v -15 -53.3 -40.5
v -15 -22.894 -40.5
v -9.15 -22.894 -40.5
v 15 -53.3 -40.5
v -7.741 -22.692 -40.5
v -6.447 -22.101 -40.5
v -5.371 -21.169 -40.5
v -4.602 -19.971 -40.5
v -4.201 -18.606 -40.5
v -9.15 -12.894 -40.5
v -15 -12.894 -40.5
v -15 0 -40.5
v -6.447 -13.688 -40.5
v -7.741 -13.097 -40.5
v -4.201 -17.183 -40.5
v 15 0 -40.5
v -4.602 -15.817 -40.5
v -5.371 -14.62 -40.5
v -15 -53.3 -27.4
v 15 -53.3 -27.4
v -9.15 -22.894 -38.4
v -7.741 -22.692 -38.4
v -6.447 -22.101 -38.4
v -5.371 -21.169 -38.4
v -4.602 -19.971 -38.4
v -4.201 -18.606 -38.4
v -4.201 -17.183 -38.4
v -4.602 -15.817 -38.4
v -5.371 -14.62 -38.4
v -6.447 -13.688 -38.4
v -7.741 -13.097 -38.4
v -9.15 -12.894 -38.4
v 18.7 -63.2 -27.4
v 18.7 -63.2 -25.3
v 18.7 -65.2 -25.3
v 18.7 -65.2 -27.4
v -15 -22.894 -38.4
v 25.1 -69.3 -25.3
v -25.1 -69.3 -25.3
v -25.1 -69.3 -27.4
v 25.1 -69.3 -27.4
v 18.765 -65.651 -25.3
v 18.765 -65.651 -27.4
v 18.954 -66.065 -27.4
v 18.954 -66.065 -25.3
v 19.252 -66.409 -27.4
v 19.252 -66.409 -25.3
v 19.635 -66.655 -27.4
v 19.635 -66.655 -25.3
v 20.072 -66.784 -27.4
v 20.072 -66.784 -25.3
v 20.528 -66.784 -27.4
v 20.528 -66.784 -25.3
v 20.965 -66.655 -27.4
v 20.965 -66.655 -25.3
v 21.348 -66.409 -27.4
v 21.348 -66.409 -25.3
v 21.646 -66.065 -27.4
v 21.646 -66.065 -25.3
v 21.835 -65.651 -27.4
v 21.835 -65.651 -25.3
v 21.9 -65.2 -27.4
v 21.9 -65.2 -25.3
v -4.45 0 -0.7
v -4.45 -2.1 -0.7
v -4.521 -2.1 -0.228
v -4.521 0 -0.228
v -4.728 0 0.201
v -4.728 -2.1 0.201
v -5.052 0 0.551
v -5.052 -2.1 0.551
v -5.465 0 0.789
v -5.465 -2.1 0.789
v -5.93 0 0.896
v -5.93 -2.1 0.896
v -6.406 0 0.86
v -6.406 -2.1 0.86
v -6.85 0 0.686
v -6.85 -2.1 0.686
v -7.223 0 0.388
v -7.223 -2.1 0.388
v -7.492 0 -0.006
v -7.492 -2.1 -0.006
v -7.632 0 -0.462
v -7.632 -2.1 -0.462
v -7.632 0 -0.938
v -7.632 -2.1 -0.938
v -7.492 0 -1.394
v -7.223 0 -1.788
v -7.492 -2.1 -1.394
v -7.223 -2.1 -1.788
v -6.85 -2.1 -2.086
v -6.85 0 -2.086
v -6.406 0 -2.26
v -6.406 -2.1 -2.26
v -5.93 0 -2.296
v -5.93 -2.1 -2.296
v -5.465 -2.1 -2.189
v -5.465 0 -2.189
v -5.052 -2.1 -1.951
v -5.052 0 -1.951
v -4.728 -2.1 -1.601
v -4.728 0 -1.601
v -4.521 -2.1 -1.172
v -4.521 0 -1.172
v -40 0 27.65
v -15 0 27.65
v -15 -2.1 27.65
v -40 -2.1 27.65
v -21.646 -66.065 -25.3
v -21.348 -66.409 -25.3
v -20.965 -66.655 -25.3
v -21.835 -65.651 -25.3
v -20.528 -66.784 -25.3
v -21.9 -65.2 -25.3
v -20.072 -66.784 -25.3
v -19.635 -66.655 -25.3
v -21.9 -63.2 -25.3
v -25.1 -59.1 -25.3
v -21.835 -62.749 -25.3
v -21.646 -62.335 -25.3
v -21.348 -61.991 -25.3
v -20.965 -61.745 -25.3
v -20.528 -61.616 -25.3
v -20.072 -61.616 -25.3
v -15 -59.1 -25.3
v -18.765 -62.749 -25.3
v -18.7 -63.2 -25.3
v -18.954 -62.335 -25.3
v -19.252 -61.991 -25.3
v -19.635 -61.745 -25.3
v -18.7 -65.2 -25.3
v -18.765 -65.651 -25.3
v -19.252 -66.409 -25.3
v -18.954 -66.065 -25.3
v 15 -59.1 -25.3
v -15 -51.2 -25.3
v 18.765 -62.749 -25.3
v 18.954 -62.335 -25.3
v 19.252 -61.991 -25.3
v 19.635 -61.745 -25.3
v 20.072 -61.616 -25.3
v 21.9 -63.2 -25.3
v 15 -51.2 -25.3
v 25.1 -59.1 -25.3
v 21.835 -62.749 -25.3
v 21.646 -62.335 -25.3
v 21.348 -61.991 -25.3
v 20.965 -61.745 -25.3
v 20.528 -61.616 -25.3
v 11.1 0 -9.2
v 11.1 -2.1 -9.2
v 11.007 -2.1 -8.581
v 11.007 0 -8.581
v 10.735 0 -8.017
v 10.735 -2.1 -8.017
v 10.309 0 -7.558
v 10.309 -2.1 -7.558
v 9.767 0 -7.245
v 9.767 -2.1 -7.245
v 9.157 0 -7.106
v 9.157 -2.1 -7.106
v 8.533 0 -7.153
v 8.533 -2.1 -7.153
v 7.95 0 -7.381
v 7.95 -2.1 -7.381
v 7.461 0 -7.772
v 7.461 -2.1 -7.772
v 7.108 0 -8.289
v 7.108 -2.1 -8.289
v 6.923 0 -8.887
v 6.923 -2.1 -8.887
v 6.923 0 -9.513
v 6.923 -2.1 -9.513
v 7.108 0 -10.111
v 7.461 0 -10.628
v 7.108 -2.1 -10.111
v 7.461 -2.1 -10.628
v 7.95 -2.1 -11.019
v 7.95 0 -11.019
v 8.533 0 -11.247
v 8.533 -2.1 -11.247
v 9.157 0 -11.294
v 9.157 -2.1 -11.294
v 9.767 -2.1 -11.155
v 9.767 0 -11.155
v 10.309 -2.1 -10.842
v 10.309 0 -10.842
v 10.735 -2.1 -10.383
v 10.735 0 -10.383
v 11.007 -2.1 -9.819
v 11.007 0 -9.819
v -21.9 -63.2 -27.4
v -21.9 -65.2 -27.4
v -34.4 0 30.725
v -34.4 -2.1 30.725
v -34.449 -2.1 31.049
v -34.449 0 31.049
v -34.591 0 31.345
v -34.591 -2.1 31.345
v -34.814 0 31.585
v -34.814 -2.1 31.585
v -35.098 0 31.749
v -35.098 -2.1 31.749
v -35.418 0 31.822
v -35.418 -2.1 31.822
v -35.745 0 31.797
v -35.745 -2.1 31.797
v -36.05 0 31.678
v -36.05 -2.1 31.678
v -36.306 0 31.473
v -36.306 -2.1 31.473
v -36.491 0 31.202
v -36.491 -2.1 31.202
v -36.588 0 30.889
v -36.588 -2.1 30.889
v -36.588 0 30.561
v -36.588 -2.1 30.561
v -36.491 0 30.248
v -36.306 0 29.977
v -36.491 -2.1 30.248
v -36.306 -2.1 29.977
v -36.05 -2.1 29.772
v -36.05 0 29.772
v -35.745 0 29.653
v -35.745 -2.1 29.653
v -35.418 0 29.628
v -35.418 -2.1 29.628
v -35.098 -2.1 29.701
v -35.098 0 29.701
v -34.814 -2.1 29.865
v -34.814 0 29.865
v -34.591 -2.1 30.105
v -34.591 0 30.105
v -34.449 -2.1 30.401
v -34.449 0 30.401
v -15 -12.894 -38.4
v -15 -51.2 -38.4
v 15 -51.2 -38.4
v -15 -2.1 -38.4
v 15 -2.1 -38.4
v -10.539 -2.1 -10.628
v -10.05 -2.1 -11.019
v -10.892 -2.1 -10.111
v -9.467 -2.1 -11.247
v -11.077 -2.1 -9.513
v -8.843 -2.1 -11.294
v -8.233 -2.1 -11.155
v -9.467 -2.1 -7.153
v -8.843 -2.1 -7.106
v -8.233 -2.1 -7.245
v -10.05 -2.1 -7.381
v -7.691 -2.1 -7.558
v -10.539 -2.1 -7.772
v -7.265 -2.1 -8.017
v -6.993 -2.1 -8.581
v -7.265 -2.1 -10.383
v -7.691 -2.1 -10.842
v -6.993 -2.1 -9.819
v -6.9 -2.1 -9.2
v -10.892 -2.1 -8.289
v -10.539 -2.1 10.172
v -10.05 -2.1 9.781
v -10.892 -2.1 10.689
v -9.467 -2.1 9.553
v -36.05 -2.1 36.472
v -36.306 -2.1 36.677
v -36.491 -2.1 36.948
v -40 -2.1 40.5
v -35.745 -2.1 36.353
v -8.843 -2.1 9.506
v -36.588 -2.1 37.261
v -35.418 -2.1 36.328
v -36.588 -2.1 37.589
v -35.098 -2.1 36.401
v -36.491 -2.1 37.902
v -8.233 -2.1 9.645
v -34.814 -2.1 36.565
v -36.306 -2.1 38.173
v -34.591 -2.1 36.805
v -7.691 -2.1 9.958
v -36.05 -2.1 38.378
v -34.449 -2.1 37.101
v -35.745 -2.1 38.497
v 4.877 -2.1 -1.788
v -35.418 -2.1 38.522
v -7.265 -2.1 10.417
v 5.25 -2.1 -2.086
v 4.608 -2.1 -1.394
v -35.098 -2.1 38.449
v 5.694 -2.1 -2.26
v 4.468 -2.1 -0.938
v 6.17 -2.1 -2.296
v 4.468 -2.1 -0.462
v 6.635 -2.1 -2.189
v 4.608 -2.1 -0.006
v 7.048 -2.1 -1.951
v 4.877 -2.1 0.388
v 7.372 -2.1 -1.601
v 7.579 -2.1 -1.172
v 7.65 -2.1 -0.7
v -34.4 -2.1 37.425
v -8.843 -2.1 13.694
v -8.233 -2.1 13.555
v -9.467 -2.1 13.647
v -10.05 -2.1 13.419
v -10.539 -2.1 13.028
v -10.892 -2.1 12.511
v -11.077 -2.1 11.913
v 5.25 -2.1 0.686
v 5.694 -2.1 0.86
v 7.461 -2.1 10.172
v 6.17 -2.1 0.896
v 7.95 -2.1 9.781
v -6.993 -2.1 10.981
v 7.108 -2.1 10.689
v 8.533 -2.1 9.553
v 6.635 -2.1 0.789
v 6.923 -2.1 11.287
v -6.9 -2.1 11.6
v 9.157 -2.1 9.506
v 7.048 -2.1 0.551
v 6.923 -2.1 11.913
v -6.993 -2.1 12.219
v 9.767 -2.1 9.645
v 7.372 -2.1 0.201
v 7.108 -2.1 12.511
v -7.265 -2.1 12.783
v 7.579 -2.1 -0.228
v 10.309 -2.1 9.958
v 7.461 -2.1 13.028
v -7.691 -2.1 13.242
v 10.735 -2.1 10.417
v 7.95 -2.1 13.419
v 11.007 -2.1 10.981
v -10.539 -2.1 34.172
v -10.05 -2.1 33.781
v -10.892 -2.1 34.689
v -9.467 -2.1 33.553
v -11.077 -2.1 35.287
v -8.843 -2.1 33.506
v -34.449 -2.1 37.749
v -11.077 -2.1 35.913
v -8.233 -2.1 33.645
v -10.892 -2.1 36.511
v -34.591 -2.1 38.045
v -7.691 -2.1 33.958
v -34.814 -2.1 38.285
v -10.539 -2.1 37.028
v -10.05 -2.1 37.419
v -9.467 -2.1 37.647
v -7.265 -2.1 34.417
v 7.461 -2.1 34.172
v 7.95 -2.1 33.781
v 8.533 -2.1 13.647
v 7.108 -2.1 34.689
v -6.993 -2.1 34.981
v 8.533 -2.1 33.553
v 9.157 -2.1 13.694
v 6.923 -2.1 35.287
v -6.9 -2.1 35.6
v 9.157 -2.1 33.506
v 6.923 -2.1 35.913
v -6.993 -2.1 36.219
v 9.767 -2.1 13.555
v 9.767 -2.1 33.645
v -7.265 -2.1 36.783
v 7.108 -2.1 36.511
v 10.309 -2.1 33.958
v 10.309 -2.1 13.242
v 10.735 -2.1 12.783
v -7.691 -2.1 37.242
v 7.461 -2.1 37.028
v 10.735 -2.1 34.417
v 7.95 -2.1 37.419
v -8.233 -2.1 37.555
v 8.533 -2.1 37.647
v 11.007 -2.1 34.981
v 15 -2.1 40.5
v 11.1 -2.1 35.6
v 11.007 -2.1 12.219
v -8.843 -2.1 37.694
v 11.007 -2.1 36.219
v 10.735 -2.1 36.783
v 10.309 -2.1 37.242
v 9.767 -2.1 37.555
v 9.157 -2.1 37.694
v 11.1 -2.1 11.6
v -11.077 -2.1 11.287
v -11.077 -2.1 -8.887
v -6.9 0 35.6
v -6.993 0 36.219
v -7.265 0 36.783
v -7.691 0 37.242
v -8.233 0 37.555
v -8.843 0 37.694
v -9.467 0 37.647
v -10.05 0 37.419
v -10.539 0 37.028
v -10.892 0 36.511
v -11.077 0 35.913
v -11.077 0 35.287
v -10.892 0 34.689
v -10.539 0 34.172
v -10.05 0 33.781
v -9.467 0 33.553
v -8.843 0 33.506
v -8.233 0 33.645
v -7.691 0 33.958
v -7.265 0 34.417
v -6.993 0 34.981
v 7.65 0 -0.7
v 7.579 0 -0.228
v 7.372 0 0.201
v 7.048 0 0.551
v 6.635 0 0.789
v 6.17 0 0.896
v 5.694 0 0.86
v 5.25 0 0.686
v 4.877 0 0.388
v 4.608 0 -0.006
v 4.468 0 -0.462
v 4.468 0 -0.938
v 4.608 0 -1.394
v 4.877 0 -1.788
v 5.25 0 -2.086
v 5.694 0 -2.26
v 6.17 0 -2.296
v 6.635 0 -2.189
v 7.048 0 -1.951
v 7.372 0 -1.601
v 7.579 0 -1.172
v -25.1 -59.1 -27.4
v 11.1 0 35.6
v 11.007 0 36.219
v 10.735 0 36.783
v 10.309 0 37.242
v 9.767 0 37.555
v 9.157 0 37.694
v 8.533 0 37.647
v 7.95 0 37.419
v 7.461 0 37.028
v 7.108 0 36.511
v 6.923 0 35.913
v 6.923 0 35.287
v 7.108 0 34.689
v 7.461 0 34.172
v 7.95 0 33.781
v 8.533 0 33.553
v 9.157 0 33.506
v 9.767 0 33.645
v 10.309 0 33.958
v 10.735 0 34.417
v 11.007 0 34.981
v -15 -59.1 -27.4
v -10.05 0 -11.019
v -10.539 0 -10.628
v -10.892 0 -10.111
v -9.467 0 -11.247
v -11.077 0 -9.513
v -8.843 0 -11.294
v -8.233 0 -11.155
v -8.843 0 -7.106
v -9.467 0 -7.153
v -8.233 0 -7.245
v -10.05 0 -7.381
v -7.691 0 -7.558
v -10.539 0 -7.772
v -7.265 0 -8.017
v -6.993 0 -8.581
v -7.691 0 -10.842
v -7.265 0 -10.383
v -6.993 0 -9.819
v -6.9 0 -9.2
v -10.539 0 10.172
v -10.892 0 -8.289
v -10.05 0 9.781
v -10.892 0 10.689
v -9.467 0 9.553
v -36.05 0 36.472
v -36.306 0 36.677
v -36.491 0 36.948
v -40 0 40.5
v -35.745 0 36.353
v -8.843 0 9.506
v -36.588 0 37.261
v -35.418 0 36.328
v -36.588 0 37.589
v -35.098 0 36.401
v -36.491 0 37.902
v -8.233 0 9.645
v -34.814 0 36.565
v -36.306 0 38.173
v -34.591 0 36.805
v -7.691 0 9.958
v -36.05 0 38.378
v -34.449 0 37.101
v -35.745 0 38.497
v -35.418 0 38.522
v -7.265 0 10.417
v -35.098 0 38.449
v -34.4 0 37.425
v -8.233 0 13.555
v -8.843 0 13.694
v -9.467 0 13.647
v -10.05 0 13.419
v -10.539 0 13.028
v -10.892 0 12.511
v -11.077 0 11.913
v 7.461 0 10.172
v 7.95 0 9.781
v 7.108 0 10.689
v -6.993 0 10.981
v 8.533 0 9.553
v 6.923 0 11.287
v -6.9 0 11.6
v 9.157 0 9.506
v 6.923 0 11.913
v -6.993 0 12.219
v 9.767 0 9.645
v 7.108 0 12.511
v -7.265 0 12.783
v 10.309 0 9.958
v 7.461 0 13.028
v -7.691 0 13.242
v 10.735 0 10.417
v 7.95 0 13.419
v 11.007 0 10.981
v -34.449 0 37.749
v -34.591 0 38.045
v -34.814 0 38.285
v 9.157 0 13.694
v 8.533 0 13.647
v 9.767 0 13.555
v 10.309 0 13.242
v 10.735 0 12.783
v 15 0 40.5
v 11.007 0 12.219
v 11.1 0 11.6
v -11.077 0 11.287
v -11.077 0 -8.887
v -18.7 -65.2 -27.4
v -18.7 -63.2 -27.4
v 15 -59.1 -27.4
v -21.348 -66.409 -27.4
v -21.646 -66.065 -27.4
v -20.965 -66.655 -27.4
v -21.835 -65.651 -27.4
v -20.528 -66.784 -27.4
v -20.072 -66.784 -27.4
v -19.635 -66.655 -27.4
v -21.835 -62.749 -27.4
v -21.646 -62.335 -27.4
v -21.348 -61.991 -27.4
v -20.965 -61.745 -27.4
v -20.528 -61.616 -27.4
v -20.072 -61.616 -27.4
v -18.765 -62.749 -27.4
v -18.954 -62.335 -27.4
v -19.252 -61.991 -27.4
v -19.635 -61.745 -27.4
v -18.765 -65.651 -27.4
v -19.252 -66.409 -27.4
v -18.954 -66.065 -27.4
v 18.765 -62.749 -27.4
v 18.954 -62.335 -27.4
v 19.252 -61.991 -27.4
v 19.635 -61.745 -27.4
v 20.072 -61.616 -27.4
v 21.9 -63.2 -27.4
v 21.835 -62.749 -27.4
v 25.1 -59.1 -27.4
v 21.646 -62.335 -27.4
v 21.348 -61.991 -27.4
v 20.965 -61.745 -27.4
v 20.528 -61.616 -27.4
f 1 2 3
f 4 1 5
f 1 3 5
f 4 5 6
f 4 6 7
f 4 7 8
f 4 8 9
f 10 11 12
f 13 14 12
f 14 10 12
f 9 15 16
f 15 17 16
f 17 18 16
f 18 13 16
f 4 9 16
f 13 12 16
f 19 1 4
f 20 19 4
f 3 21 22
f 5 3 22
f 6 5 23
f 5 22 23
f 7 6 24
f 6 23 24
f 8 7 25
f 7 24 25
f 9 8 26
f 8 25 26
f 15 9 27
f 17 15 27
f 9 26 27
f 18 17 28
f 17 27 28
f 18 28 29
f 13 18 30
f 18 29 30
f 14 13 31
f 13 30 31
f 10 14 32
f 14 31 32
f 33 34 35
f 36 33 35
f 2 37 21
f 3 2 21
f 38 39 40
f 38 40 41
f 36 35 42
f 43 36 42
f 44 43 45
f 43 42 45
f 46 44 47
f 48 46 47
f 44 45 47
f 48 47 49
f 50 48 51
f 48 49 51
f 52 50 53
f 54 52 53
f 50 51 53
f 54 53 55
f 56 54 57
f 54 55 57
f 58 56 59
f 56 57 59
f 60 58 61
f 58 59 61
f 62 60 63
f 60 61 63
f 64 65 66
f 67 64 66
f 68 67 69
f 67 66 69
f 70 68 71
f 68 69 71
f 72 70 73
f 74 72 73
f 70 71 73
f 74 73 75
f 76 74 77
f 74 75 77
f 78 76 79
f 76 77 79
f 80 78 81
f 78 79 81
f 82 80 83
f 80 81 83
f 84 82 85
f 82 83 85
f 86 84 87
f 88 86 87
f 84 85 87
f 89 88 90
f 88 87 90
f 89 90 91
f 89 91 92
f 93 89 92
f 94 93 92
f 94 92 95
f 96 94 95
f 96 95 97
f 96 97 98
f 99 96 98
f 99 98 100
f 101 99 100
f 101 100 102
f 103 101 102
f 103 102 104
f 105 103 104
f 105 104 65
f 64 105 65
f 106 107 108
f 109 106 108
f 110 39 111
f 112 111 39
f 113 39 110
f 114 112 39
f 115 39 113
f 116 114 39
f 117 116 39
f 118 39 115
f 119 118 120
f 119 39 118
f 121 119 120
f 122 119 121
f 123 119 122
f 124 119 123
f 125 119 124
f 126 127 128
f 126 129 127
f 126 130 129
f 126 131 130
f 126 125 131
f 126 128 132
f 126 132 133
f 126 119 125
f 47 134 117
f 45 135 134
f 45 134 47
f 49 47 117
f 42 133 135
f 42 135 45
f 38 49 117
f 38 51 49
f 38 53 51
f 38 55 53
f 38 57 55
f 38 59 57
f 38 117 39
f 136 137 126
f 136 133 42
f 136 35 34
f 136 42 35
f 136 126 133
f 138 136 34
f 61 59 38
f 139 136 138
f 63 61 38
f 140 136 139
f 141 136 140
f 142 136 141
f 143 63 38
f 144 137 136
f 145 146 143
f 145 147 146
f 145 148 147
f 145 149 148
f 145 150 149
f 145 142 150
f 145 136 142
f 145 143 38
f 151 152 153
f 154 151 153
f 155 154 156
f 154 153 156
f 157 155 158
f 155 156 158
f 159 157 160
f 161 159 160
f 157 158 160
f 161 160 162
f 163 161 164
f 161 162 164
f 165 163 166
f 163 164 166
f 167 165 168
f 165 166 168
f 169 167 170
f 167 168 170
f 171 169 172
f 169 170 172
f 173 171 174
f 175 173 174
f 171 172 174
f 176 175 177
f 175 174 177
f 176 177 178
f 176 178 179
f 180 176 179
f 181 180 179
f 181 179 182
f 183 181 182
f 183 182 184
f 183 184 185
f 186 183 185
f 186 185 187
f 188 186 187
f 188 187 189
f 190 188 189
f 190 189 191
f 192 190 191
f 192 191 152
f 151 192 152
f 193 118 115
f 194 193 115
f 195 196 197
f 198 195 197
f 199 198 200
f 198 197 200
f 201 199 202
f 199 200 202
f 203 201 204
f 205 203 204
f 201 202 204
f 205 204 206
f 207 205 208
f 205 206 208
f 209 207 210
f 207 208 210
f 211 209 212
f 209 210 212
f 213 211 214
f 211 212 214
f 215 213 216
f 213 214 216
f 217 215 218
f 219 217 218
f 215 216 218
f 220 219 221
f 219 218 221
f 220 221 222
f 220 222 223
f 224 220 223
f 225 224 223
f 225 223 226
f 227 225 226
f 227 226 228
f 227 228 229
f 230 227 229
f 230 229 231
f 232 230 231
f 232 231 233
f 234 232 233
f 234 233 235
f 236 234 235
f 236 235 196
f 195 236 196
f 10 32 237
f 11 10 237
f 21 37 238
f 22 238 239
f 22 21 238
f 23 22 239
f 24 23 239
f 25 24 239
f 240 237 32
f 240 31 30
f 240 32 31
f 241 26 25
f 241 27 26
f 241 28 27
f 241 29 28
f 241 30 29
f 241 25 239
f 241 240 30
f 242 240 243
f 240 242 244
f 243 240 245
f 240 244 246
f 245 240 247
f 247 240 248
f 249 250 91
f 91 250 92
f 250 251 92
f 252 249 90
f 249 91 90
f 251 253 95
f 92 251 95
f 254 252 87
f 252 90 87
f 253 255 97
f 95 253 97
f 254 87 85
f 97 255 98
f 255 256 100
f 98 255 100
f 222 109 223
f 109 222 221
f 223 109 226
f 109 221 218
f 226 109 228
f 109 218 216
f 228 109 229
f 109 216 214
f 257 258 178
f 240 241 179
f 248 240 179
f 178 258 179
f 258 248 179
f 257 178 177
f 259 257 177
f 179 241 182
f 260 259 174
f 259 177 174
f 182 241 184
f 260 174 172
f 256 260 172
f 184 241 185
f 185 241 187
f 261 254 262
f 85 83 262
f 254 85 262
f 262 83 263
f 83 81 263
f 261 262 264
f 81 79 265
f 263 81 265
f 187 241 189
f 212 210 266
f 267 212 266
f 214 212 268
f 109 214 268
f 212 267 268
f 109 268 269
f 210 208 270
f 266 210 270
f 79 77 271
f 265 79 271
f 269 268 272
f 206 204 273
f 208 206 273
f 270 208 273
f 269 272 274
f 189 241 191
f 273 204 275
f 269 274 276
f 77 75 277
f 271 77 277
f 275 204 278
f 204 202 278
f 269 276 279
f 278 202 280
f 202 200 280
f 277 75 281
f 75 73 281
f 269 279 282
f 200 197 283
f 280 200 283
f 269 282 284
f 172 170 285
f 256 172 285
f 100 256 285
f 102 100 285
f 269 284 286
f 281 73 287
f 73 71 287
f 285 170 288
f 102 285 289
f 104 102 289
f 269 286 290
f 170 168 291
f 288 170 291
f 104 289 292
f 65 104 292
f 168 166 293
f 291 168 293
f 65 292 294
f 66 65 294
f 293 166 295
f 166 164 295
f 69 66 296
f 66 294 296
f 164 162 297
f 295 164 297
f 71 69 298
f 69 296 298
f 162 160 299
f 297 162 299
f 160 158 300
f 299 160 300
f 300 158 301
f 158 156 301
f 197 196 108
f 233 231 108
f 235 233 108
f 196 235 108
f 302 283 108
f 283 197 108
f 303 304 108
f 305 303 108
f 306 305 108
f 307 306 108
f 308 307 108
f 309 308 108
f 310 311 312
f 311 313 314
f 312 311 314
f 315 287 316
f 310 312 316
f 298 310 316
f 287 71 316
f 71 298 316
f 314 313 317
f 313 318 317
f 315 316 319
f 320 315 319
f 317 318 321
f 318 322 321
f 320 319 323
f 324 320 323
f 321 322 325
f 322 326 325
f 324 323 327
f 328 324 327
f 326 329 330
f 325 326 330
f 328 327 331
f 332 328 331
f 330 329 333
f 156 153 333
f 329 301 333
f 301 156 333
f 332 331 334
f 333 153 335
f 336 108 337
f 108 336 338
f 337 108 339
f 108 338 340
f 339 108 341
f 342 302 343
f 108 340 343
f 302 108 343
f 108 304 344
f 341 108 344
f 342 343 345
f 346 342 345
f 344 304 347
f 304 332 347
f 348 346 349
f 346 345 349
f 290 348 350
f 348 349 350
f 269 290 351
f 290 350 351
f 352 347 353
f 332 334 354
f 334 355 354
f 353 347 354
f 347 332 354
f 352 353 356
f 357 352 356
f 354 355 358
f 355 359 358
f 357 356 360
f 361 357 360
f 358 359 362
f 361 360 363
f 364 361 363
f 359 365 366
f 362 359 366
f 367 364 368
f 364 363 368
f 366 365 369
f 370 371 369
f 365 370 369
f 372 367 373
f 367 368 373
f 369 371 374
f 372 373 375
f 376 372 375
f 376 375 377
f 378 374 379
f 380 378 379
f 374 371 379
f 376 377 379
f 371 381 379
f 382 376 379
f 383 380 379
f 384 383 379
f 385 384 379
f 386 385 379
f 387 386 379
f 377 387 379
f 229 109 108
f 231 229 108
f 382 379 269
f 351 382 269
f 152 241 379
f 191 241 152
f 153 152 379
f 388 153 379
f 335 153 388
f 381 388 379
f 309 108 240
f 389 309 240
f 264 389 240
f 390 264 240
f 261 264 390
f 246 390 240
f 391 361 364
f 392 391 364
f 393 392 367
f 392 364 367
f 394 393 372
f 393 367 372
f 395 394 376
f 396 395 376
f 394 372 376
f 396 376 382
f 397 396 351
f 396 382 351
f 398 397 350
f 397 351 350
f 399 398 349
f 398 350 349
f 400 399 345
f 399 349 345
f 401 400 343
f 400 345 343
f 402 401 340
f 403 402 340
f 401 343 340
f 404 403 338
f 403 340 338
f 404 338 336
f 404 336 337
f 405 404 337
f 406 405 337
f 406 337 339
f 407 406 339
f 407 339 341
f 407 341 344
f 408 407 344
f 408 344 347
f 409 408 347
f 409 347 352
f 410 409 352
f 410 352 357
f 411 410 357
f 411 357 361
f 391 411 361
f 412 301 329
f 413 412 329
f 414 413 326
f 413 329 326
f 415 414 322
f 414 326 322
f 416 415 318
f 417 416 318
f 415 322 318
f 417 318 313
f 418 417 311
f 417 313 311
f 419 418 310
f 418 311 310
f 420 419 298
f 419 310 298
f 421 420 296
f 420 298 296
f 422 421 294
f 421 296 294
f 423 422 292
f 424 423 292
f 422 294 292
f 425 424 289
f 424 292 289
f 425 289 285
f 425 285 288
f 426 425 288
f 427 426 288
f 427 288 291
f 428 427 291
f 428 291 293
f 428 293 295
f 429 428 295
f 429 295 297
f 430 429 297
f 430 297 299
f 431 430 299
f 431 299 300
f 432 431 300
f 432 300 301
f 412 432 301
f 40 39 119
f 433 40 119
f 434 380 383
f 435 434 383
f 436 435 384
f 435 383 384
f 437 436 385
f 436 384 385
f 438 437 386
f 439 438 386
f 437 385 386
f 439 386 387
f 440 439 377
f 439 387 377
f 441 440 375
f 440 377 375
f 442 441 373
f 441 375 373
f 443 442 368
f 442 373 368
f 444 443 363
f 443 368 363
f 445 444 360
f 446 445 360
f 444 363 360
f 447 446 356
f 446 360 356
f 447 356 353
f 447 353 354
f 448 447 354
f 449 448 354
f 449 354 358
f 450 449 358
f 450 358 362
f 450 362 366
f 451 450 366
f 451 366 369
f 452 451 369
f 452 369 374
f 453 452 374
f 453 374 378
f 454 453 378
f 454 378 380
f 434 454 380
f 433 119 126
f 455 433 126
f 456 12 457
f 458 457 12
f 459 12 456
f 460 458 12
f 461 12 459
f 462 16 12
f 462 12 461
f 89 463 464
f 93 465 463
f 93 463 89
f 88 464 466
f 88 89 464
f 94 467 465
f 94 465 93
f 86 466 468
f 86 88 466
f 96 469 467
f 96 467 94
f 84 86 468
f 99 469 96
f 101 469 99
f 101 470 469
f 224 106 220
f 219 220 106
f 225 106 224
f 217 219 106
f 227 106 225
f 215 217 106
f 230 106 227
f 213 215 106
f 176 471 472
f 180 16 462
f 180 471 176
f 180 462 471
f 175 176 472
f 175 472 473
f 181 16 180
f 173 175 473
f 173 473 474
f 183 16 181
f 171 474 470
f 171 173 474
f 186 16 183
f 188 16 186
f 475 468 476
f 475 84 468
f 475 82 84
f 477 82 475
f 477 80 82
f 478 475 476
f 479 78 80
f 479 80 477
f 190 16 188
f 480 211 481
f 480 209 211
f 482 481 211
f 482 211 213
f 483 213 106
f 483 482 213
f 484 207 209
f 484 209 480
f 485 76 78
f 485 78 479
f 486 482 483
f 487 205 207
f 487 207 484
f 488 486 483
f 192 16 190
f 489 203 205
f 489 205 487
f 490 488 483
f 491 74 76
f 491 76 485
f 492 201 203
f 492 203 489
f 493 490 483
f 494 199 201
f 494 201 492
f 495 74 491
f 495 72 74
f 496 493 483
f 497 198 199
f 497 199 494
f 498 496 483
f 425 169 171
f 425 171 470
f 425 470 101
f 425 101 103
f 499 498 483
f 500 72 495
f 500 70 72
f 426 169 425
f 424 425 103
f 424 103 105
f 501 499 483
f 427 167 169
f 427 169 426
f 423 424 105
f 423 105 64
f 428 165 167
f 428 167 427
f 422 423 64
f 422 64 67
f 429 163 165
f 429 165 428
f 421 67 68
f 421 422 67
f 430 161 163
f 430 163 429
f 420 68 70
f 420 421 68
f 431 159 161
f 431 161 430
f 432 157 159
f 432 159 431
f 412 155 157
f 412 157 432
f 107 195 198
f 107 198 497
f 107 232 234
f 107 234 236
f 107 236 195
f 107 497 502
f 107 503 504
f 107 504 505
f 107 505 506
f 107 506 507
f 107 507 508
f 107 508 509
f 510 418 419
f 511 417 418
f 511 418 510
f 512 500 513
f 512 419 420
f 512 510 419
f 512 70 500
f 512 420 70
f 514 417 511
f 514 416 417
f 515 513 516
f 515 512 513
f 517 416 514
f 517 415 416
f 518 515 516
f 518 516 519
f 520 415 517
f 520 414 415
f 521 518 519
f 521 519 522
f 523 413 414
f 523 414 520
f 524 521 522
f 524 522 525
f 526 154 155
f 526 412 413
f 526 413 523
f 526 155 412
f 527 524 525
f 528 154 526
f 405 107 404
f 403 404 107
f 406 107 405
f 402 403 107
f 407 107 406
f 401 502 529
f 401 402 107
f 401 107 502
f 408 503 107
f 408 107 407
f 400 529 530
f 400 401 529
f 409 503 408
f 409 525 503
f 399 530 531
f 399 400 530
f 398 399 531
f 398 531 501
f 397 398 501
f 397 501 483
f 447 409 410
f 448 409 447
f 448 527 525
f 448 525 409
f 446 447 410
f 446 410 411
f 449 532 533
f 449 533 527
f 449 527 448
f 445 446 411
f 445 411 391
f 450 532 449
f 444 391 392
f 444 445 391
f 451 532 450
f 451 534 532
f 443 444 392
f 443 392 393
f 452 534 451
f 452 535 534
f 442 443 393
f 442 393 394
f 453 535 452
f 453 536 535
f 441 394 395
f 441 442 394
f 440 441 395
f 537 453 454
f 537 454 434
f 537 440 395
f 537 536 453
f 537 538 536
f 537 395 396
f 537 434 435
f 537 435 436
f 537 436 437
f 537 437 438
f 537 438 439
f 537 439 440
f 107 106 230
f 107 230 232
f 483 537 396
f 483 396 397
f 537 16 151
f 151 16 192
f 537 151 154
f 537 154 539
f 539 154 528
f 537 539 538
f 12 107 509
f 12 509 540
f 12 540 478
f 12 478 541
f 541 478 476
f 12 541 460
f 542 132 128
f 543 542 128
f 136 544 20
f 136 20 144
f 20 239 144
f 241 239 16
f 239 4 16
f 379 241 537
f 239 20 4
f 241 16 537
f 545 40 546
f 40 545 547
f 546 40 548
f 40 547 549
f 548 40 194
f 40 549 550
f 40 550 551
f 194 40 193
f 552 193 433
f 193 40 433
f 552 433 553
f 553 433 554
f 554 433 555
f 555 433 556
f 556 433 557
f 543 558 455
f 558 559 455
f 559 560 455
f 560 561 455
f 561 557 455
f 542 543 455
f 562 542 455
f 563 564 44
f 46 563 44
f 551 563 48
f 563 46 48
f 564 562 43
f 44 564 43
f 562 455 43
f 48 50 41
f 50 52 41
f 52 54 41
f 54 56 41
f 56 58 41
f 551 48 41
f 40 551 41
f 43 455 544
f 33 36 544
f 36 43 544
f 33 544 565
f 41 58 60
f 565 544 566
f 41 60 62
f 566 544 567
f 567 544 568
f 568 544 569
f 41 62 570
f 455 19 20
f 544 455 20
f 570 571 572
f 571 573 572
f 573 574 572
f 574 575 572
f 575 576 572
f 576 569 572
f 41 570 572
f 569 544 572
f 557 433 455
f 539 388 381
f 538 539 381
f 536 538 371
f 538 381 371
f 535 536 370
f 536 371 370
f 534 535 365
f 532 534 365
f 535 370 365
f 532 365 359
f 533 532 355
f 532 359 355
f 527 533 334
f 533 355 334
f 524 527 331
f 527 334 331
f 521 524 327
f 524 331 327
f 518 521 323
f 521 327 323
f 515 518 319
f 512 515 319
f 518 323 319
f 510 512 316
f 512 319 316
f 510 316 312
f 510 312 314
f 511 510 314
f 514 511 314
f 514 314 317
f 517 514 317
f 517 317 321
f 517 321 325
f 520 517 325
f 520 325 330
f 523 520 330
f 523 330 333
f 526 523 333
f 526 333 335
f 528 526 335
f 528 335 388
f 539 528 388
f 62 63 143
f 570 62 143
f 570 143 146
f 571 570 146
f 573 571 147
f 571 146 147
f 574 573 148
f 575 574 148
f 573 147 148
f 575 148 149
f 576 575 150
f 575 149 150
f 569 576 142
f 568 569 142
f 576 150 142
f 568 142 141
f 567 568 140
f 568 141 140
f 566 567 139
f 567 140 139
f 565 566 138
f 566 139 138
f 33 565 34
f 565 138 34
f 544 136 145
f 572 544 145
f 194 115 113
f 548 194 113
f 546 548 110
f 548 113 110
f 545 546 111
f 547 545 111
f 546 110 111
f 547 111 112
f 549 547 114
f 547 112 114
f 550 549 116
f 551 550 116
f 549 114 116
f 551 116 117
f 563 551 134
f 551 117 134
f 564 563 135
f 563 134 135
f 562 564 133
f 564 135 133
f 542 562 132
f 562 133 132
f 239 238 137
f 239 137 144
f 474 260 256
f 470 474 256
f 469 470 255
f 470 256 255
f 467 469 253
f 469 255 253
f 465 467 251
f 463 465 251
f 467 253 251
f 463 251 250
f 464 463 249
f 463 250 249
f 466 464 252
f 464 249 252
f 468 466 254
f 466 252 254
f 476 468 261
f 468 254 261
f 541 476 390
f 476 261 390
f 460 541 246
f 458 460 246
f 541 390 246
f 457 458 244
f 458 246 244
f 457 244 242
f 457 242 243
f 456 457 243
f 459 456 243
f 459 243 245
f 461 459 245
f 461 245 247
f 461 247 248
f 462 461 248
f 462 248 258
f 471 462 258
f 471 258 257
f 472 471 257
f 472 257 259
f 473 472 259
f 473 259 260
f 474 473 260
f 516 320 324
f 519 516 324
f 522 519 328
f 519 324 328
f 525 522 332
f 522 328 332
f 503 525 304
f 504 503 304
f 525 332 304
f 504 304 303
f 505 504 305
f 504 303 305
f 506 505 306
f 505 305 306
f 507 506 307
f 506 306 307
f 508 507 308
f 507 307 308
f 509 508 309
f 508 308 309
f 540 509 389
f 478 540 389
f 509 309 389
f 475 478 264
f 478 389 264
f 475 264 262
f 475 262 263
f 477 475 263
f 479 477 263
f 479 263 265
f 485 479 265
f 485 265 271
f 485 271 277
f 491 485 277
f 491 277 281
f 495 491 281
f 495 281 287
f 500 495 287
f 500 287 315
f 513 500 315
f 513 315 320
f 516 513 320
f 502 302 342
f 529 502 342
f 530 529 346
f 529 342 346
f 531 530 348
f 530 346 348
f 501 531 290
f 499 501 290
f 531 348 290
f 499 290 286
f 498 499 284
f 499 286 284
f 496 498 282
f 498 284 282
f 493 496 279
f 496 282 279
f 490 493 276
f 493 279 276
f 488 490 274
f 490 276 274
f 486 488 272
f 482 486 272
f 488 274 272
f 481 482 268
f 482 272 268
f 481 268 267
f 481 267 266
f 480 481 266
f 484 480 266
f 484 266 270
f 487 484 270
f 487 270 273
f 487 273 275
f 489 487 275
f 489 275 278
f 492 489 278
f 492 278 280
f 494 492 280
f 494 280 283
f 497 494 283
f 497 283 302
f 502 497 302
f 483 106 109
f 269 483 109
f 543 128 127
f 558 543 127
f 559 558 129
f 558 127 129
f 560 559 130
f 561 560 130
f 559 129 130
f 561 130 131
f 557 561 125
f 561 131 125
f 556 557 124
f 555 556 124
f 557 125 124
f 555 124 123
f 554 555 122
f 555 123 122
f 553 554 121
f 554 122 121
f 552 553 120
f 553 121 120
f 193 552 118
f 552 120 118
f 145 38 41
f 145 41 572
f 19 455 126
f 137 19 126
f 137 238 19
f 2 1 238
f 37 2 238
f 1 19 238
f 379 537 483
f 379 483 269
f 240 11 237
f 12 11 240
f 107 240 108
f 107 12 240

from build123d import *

# Parameters (mm, degrees)
F0_W      = 30
F0_H      = 81
F1_DEPTH  = 2.1
F2_W      = 30
F2_H      = 2.1
F3_DEPTH  = 51.2
F4_W      = 30
F4_H      = 2.1
F5_DEPTH  = 13.1
F6_W      = 30
F6_H      = 2.1
F7_DEPTH  = 16
F8_W      = 10.1
F8_H      = 10.2
F9_DEPTH  = 2.1
F11_DEPTH = 15.201
F13_DEPTH = 2.101
F14_R     = 2.1
F14_R_2   = 1.6
F15_DEPTH = 2.101
F16_W     = 2.1
F16_H     = 12.85
F17_DEPTH = 25
F18_R     = 1.1
F19_DEPTH = 25


with BuildPart() as f1:
    # F0 (on Front) → F1 (new body)
    with BuildSketch(Plane.XZ):
        Rectangle(F0_W, F0_H)
    extrude(amount=F1_DEPTH)

    # F2 (on face) → F3 (join)
    with BuildSketch(Plane.XZ.offset(2.1)):
        with Locations((0, -39.45)):
            Rectangle(F2_W, F2_H)
    extrude(amount=F3_DEPTH)

    # F4 (on face) → F5 (join)
    with BuildSketch(Plane.XY.offset(-38.4)):
        with Locations((0, -52.25)):
            Rectangle(F4_W, F4_H)
    extrude(amount=F5_DEPTH)

    # F6 (on face) → F7 (join)
    with BuildSketch(Plane.XZ.offset(53.3)):
        with Locations((0, -26.35)):
            Rectangle(F6_W, F6_H)
    extrude(amount=F7_DEPTH)

    # F8 (on face) → F9 (join)
    with BuildSketch(Plane.XY.offset(-25.3)):
        with Locations((-20.05, -64.2)):
            Rectangle(F8_W, F8_H)
        with Locations((20.05, -64.2)):
            Rectangle(F8_W, F8_H)
    extrude(amount=-F9_DEPTH)

    # F10 (on face) → F11 (cut, through all)
    with BuildSketch(Plane.XY.offset(-25.3)):
        with BuildLine():
            Line((-21.9, -63.2), (-21.9, -65.2))
            ThreePointArc((-21.9, -65.2), (-20.3, -66.8), (-18.7, -65.2))
            Line((-18.7, -65.2), (-18.7, -63.2))
            ThreePointArc((-18.7, -63.2), (-20.3, -61.6), (-21.9, -63.2))
        make_face()
        with BuildLine():
            Line((18.7, -63.2), (18.7, -65.2))
            ThreePointArc((18.7, -65.2), (20.3, -66.8), (21.9, -65.2))
            Line((21.9, -65.2), (21.9, -63.2))
            ThreePointArc((21.9, -63.2), (20.3, -61.6), (18.7, -63.2))
        make_face()
    extrude(amount=-F11_DEPTH, mode=Mode.SUBTRACT)

    # F12 (on face) → F13 (cut, through all)
    with BuildSketch(Plane.XY.offset(-38.4)):
        with BuildLine():
            Line((-15, -22.894339), (-9.15, -22.894339))
            ThreePointArc((-9.15, -22.894339), (-4.15, -17.894339), (-9.15, -12.894339))
            Line((-9.15, -12.894339), (-15, -12.894339))
            Line((-15, -12.894339), (-15, -22.894339))
        make_face()
    extrude(amount=-F13_DEPTH, mode=Mode.SUBTRACT)

    # F14 (on face) → F15 (cut, through all)
    with BuildSketch(Plane.XZ.offset(2.1)):
        with Locations((9, 35.6)):
            Circle(F14_R)
        with Locations((9, 11.6)):
            Circle(F14_R)
        with Locations((-9, 35.6)):
            Circle(F14_R)
        with Locations((-9, 11.6)):
            Circle(F14_R)
        with Locations((9, -9.2)):
            Circle(F14_R)
        with Locations((-9, -9.2)):
            Circle(F14_R)
        with Locations((6.05, -0.7)):
            Circle(F14_R_2)
        with Locations((-6.05, -0.7)):
            Circle(F14_R_2)
    extrude(amount=-F15_DEPTH, mode=Mode.SUBTRACT)

    # F16 (on face) → F17 (join)
    with BuildSketch(Plane(origin=(-15, 0, 0), x_dir=(0, -1, 0), z_dir=(-1, 0, 0))):
        with Locations((1.05, 34.075)):
            Rectangle(F16_W, F16_H)
    extrude(amount=F17_DEPTH)

    # F18 (on face) → F19 (cut)
    with BuildSketch(Plane.XZ.offset(2.1)):
        with Locations((-35.5, 37.425)):
            Circle(F18_R)
        with Locations((-35.5, 30.725)):
            Circle(F18_R)
    extrude(amount=-F19_DEPTH, mode=Mode.SUBTRACT)


solid = f1.part
